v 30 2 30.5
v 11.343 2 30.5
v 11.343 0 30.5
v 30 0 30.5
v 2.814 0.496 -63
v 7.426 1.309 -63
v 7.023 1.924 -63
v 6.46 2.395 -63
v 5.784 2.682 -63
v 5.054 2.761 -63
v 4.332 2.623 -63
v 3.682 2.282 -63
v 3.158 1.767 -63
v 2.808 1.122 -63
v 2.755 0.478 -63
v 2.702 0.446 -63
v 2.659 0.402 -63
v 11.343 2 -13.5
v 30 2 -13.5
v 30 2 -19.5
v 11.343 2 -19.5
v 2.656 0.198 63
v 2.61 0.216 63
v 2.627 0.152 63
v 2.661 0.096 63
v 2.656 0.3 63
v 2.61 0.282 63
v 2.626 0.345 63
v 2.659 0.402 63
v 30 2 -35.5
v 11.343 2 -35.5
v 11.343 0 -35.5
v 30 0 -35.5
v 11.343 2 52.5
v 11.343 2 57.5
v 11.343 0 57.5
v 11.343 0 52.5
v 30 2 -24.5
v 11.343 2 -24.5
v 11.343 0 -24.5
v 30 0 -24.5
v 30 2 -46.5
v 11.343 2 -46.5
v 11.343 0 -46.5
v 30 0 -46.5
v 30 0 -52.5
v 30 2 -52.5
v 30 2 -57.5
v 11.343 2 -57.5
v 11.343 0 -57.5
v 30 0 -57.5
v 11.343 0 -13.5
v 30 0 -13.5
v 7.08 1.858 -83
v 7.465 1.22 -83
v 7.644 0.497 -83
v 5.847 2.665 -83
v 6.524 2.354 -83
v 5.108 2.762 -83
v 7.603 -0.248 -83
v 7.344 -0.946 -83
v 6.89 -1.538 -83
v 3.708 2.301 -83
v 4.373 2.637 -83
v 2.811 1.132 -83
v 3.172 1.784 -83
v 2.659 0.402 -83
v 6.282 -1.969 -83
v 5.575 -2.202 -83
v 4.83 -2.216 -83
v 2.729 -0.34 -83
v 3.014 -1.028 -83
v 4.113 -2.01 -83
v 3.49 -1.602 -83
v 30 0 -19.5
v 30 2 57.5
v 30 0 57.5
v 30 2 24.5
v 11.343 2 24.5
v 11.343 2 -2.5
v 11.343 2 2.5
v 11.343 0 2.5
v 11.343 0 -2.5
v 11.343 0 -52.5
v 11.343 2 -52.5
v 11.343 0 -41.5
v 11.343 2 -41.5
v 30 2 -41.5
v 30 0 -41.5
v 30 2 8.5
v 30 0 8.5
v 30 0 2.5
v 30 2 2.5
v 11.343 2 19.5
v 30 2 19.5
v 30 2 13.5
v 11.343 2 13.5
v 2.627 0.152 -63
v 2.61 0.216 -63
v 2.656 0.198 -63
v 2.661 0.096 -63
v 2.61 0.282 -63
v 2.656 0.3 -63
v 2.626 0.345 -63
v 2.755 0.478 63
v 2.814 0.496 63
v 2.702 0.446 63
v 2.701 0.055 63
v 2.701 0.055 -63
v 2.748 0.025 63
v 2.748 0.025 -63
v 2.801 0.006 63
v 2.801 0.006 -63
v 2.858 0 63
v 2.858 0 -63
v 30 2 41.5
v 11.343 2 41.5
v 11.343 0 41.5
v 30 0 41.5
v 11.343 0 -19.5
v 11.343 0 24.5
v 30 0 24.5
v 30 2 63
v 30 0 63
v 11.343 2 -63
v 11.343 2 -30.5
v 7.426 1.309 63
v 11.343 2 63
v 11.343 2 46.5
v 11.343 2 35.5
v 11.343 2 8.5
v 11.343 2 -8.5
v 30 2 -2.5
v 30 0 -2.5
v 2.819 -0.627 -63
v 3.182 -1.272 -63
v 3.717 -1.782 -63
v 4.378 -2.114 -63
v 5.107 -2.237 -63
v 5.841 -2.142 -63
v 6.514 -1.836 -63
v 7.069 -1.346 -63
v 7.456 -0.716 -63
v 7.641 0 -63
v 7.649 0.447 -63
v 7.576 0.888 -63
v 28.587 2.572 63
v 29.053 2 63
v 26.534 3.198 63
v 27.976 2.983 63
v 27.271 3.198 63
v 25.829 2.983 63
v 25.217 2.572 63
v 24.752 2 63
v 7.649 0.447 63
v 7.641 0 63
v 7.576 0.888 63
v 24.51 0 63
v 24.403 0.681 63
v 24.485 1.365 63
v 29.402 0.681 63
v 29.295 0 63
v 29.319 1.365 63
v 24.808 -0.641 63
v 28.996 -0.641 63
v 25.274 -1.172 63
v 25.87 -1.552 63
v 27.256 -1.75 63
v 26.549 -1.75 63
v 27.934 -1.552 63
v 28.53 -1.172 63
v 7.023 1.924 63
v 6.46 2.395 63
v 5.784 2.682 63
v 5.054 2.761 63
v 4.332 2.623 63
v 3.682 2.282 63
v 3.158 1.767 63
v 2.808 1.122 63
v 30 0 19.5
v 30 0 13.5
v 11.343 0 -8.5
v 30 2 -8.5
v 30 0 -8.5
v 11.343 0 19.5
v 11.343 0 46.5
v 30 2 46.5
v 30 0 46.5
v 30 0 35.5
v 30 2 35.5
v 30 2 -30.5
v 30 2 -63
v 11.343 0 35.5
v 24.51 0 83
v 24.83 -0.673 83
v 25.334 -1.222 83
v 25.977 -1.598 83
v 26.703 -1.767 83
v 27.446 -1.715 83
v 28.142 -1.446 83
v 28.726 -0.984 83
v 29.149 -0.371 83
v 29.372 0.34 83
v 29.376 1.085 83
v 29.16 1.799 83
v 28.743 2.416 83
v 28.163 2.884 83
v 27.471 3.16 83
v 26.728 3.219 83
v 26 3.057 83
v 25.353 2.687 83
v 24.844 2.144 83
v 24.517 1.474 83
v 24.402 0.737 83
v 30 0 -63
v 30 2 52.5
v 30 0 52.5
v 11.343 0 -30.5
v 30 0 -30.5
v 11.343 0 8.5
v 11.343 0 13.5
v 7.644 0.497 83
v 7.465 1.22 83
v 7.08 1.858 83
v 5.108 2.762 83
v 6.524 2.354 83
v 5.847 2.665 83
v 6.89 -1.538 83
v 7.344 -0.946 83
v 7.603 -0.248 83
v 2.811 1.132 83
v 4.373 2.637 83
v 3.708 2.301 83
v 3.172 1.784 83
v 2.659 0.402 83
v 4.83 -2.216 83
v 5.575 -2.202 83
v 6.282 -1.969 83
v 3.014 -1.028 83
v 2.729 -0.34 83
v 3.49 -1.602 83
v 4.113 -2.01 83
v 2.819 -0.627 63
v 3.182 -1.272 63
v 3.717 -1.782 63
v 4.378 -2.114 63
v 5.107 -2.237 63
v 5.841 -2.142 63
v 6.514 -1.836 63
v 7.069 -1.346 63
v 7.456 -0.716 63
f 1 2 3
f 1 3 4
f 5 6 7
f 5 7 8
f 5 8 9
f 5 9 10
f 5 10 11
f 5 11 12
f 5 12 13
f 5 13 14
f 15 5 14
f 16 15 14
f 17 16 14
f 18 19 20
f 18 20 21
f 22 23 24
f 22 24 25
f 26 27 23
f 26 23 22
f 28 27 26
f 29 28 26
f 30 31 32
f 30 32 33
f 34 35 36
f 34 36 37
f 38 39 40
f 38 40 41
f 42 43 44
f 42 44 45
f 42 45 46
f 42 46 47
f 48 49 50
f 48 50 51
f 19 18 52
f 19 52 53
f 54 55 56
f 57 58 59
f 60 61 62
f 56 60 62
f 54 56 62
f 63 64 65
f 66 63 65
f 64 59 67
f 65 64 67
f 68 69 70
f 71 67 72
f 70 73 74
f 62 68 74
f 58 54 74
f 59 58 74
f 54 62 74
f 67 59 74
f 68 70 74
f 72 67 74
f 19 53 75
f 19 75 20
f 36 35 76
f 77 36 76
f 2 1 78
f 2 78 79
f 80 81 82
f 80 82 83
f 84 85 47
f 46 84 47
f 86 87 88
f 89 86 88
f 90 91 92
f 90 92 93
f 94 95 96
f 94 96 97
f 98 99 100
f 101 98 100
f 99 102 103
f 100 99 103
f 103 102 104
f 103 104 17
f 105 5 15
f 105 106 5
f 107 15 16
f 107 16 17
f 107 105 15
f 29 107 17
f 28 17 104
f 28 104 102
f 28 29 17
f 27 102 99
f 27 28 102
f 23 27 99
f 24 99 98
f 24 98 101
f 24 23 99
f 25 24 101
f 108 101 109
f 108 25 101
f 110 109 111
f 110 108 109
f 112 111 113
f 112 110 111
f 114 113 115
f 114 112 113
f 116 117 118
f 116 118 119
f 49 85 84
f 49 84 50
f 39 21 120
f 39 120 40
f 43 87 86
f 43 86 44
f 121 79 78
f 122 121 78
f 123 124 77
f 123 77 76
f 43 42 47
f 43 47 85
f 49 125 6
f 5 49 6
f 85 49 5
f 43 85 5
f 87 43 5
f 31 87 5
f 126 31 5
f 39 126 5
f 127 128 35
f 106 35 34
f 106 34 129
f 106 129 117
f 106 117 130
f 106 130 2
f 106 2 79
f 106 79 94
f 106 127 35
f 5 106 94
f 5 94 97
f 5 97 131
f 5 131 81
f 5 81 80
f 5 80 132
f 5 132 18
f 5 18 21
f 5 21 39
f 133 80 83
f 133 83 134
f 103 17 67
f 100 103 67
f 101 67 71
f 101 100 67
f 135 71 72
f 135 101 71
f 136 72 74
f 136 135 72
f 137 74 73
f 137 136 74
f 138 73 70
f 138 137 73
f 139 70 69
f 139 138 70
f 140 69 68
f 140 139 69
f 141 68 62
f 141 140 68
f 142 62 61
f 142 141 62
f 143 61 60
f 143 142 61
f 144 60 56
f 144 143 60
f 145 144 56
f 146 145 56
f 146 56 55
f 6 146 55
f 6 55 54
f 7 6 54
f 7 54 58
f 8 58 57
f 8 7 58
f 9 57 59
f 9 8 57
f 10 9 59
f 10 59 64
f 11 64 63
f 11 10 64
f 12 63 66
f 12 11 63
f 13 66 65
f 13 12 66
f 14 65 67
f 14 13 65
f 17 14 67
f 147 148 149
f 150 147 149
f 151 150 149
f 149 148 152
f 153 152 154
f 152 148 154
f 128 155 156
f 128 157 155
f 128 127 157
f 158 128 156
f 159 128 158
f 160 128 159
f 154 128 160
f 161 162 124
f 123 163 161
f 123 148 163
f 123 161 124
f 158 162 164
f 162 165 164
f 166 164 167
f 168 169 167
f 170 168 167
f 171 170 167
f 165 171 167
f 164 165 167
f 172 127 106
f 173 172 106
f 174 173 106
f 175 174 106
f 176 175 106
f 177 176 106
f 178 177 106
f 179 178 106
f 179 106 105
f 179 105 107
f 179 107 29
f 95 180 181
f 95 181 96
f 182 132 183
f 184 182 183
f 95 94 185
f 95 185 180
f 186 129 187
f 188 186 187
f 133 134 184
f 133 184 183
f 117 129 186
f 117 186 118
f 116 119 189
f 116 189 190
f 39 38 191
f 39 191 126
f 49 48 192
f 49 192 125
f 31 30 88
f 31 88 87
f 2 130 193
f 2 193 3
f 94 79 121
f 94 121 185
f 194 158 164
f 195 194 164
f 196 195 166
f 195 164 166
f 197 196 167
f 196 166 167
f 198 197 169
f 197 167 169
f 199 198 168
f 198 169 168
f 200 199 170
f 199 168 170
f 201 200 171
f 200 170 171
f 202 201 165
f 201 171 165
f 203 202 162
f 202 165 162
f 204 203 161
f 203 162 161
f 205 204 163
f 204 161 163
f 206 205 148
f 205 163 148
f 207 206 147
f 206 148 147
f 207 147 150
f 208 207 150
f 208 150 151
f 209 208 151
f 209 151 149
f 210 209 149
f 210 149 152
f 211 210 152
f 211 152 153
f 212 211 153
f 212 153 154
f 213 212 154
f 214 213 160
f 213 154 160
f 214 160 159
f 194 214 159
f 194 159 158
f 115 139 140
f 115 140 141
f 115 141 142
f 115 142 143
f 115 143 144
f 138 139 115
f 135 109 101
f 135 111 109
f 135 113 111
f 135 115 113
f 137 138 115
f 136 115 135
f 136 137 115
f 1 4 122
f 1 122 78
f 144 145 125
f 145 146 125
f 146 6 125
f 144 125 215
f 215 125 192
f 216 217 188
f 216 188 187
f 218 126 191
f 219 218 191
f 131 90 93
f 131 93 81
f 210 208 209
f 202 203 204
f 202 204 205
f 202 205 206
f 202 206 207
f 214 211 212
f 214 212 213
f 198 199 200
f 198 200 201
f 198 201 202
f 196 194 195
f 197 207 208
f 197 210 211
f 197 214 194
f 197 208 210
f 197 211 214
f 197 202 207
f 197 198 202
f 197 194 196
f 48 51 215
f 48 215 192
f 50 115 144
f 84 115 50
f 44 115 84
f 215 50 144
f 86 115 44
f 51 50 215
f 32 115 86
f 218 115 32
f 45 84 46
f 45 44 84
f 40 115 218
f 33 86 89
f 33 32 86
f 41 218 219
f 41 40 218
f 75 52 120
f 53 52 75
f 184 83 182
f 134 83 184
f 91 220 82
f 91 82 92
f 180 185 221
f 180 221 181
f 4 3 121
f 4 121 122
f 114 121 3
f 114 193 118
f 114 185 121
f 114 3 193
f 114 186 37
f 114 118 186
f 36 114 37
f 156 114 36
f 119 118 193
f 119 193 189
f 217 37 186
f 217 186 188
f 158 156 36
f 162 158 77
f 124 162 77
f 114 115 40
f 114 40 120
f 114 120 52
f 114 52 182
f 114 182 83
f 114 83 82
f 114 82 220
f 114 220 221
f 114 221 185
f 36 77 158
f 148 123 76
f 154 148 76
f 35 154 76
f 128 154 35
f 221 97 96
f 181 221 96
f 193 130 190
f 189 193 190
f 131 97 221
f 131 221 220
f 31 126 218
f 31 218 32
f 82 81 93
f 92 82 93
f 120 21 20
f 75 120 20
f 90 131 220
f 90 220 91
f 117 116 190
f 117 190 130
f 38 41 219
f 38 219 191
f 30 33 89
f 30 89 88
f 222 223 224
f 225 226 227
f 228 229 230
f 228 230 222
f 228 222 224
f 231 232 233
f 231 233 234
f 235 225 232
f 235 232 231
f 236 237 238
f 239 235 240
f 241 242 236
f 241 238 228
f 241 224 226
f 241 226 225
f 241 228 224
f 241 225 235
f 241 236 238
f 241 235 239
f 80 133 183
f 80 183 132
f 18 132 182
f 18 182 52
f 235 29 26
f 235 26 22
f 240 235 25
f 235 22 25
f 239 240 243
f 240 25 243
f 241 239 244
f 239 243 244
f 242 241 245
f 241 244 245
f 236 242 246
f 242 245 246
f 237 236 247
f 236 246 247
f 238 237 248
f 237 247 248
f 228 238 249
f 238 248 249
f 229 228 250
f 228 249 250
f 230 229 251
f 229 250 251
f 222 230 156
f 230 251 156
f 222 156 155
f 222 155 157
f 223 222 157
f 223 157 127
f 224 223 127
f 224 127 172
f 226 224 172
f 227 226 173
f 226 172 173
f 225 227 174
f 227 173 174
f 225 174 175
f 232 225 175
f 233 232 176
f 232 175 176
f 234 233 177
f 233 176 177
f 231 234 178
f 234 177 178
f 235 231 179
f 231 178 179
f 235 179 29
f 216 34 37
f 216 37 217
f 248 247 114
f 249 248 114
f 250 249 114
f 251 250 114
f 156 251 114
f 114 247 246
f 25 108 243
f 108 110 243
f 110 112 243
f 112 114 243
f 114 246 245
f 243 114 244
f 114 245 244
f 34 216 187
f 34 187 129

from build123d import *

# Parameters (mm, degrees)
EXTRUDE_1_DEPTH          = 63
SKETCH_2_W               = 37.314872722
SKETCH_2_H               = 5
CUT_EXTRUDE_1_DEPTH      = 50
PATTERN_LINEAR_1_COUNT   = 6
PATTERN_LINEAR_1_PITCH   = 11
MIRROR_1_COPY_1_SKETCH_W = 37.314872722
MIRROR_1_COPY_1_SKETCH_H = 5
MIRROR_1_COPY_1_DEPTH    = 50
MIRROR_1_COPY_2_SKETCH_W = 37.314872722
MIRROR_1_COPY_2_SKETCH_H = 5
MIRROR_1_COPY_2_DEPTH    = 50
MIRROR_1_COPY_3_SKETCH_W = 37.314872722
MIRROR_1_COPY_3_SKETCH_H = 5
MIRROR_1_COPY_3_DEPTH    = 50
MIRROR_1_COPY_4_SKETCH_W = 37.314872722
MIRROR_1_COPY_4_SKETCH_H = 5
MIRROR_1_COPY_4_DEPTH    = 50
MIRROR_1_COPY_5_SKETCH_W = 37.314872722
MIRROR_1_COPY_5_SKETCH_H = 5
MIRROR_1_COPY_5_DEPTH    = 50
MIRROR_1_COPY_6_SKETCH_W = 37.314872722
MIRROR_1_COPY_6_SKETCH_H = 5
MIRROR_1_COPY_6_DEPTH    = 50
EXTRUDE_START            = 63
SKETCH_3_R               = 2.5
EXTRUDE_2_DEPTH          = 20
SKETCH_4_R               = 2.5
EXTRUDE_3_DEPTH          = 20


with BuildPart() as part:
    # 草图1 → 凸台-拉伸1 (new, symmetric)
    with BuildSketch(Plane.XY):
        with BuildLine():
            Line((2.857513076, 0), (30, 0))
            Line((30, 0), (30, 2))
            Line((30, 2), (11.342563639, 2))
            Line((11.342563639, 2), (2.814101031, 0.496201938))
            ThreePointArc((2.814101031, 0.496201938), (2.608464401, 0.228211064), (2.857513076, 0))
        make_face()
    extrude(amount=EXTRUDE_1_DEPTH, both=True)

    # 草图2 → 切除-拉伸1 (cut, symmetric)
    with BuildSketch(Plane(origin=(0, 2, 0), x_dir=(1, 0, 0), z_dir=(0, 1, 0))):
        with Locations((30, 0)):
            Rectangle(SKETCH_2_W, SKETCH_2_H)
    cut_extrude_1 = extrude(amount=CUT_EXTRUDE_1_DEPTH, both=True, mode=Mode.SUBTRACT)

    # 阵列(线性)1: 切除-拉伸1 ×6
    with Locations(*[(0, 0, -i * PATTERN_LINEAR_1_PITCH) for i in range(1, PATTERN_LINEAR_1_COUNT)]):
        add(cut_extrude_1, mode=Mode.SUBTRACT)

    # 镜向1 copy 1 sketch → 镜向1 copy 1 (cut, symmetric)
    with BuildSketch(Plane(origin=(0, 2, 11), x_dir=(1, 0, 0), z_dir=(0, 1, 0))):
        with Locations((30, 0)):
            Rectangle(MIRROR_1_COPY_1_SKETCH_W, MIRROR_1_COPY_1_SKETCH_H)
    extrude(amount=MIRROR_1_COPY_1_DEPTH, both=True, mode=Mode.SUBTRACT)

    # 镜向1 copy 2 sketch → 镜向1 copy 2 (cut, symmetric)
    with BuildSketch(Plane(origin=(0, 2, 22), x_dir=(1, 0, 0), z_dir=(0, 1, 0))):
        with Locations((30, 0)):
            Rectangle(MIRROR_1_COPY_2_SKETCH_W, MIRROR_1_COPY_2_SKETCH_H)
    extrude(amount=MIRROR_1_COPY_2_DEPTH, both=True, mode=Mode.SUBTRACT)

    # 镜向1 copy 3 sketch → 镜向1 copy 3 (cut, symmetric)
    with BuildSketch(Plane(origin=(0, 2, 33), x_dir=(1, 0, 0), z_dir=(0, 1, 0))):
        with Locations((30, 0)):
            Rectangle(MIRROR_1_COPY_3_SKETCH_W, MIRROR_1_COPY_3_SKETCH_H)
    extrude(amount=MIRROR_1_COPY_3_DEPTH, both=True, mode=Mode.SUBTRACT)

    # 镜向1 copy 4 sketch → 镜向1 copy 4 (cut, symmetric)
    with BuildSketch(Plane(origin=(0, 2, 44), x_dir=(1, 0, 0), z_dir=(0, 1, 0))):
        with Locations((30, 0)):
            Rectangle(MIRROR_1_COPY_4_SKETCH_W, MIRROR_1_COPY_4_SKETCH_H)
    extrude(amount=MIRROR_1_COPY_4_DEPTH, both=True, mode=Mode.SUBTRACT)

    # 镜向1 copy 5 sketch → 镜向1 copy 5 (cut, symmetric)
    with BuildSketch(Plane(origin=(0, 2, 55), x_dir=(1, 0, 0), z_dir=(0, 1, 0))):
        with Locations((30, 0)):
            Rectangle(MIRROR_1_COPY_5_SKETCH_W, MIRROR_1_COPY_5_SKETCH_H)
    extrude(amount=MIRROR_1_COPY_5_DEPTH, both=True, mode=Mode.SUBTRACT)

    # 镜向1 copy 6 sketch → 镜向1 copy 6 (cut, symmetric)
    with BuildSketch(Plane(origin=(0, 2, 0), x_dir=(1, 0, 0), z_dir=(0, 1, 0))):
        with Locations((30, 0)):
            Rectangle(MIRROR_1_COPY_6_SKETCH_W, MIRROR_1_COPY_6_SKETCH_H)
    extrude(amount=MIRROR_1_COPY_6_DEPTH, both=True, mode=Mode.SUBTRACT)

    # 草图3 → 凸台-拉伸2 (add)
    with BuildSketch(Plane.XY.offset(EXTRUDE_START)):
        with Locations(Location((5.155322669, 0.262603589, 0), (0, 0, 176.797698594))):
            Circle(SKETCH_3_R)
    extrude_2 = extrude(amount=EXTRUDE_2_DEPTH)

    # 镜向2: 凸台-拉伸2 across plane
    add(extrude_2.mirror(Plane.XY))

    # 草图4 → 凸台-拉伸3 (add, through all)
    with BuildSketch(Plane.XY.offset(63)):
        with Locations(Location((26.90226766, 0.725038627, 0), (0, 0, 196.858881031))):
            Circle(SKETCH_4_R)
    extrude(amount=EXTRUDE_3_DEPTH)


solid = part.part
